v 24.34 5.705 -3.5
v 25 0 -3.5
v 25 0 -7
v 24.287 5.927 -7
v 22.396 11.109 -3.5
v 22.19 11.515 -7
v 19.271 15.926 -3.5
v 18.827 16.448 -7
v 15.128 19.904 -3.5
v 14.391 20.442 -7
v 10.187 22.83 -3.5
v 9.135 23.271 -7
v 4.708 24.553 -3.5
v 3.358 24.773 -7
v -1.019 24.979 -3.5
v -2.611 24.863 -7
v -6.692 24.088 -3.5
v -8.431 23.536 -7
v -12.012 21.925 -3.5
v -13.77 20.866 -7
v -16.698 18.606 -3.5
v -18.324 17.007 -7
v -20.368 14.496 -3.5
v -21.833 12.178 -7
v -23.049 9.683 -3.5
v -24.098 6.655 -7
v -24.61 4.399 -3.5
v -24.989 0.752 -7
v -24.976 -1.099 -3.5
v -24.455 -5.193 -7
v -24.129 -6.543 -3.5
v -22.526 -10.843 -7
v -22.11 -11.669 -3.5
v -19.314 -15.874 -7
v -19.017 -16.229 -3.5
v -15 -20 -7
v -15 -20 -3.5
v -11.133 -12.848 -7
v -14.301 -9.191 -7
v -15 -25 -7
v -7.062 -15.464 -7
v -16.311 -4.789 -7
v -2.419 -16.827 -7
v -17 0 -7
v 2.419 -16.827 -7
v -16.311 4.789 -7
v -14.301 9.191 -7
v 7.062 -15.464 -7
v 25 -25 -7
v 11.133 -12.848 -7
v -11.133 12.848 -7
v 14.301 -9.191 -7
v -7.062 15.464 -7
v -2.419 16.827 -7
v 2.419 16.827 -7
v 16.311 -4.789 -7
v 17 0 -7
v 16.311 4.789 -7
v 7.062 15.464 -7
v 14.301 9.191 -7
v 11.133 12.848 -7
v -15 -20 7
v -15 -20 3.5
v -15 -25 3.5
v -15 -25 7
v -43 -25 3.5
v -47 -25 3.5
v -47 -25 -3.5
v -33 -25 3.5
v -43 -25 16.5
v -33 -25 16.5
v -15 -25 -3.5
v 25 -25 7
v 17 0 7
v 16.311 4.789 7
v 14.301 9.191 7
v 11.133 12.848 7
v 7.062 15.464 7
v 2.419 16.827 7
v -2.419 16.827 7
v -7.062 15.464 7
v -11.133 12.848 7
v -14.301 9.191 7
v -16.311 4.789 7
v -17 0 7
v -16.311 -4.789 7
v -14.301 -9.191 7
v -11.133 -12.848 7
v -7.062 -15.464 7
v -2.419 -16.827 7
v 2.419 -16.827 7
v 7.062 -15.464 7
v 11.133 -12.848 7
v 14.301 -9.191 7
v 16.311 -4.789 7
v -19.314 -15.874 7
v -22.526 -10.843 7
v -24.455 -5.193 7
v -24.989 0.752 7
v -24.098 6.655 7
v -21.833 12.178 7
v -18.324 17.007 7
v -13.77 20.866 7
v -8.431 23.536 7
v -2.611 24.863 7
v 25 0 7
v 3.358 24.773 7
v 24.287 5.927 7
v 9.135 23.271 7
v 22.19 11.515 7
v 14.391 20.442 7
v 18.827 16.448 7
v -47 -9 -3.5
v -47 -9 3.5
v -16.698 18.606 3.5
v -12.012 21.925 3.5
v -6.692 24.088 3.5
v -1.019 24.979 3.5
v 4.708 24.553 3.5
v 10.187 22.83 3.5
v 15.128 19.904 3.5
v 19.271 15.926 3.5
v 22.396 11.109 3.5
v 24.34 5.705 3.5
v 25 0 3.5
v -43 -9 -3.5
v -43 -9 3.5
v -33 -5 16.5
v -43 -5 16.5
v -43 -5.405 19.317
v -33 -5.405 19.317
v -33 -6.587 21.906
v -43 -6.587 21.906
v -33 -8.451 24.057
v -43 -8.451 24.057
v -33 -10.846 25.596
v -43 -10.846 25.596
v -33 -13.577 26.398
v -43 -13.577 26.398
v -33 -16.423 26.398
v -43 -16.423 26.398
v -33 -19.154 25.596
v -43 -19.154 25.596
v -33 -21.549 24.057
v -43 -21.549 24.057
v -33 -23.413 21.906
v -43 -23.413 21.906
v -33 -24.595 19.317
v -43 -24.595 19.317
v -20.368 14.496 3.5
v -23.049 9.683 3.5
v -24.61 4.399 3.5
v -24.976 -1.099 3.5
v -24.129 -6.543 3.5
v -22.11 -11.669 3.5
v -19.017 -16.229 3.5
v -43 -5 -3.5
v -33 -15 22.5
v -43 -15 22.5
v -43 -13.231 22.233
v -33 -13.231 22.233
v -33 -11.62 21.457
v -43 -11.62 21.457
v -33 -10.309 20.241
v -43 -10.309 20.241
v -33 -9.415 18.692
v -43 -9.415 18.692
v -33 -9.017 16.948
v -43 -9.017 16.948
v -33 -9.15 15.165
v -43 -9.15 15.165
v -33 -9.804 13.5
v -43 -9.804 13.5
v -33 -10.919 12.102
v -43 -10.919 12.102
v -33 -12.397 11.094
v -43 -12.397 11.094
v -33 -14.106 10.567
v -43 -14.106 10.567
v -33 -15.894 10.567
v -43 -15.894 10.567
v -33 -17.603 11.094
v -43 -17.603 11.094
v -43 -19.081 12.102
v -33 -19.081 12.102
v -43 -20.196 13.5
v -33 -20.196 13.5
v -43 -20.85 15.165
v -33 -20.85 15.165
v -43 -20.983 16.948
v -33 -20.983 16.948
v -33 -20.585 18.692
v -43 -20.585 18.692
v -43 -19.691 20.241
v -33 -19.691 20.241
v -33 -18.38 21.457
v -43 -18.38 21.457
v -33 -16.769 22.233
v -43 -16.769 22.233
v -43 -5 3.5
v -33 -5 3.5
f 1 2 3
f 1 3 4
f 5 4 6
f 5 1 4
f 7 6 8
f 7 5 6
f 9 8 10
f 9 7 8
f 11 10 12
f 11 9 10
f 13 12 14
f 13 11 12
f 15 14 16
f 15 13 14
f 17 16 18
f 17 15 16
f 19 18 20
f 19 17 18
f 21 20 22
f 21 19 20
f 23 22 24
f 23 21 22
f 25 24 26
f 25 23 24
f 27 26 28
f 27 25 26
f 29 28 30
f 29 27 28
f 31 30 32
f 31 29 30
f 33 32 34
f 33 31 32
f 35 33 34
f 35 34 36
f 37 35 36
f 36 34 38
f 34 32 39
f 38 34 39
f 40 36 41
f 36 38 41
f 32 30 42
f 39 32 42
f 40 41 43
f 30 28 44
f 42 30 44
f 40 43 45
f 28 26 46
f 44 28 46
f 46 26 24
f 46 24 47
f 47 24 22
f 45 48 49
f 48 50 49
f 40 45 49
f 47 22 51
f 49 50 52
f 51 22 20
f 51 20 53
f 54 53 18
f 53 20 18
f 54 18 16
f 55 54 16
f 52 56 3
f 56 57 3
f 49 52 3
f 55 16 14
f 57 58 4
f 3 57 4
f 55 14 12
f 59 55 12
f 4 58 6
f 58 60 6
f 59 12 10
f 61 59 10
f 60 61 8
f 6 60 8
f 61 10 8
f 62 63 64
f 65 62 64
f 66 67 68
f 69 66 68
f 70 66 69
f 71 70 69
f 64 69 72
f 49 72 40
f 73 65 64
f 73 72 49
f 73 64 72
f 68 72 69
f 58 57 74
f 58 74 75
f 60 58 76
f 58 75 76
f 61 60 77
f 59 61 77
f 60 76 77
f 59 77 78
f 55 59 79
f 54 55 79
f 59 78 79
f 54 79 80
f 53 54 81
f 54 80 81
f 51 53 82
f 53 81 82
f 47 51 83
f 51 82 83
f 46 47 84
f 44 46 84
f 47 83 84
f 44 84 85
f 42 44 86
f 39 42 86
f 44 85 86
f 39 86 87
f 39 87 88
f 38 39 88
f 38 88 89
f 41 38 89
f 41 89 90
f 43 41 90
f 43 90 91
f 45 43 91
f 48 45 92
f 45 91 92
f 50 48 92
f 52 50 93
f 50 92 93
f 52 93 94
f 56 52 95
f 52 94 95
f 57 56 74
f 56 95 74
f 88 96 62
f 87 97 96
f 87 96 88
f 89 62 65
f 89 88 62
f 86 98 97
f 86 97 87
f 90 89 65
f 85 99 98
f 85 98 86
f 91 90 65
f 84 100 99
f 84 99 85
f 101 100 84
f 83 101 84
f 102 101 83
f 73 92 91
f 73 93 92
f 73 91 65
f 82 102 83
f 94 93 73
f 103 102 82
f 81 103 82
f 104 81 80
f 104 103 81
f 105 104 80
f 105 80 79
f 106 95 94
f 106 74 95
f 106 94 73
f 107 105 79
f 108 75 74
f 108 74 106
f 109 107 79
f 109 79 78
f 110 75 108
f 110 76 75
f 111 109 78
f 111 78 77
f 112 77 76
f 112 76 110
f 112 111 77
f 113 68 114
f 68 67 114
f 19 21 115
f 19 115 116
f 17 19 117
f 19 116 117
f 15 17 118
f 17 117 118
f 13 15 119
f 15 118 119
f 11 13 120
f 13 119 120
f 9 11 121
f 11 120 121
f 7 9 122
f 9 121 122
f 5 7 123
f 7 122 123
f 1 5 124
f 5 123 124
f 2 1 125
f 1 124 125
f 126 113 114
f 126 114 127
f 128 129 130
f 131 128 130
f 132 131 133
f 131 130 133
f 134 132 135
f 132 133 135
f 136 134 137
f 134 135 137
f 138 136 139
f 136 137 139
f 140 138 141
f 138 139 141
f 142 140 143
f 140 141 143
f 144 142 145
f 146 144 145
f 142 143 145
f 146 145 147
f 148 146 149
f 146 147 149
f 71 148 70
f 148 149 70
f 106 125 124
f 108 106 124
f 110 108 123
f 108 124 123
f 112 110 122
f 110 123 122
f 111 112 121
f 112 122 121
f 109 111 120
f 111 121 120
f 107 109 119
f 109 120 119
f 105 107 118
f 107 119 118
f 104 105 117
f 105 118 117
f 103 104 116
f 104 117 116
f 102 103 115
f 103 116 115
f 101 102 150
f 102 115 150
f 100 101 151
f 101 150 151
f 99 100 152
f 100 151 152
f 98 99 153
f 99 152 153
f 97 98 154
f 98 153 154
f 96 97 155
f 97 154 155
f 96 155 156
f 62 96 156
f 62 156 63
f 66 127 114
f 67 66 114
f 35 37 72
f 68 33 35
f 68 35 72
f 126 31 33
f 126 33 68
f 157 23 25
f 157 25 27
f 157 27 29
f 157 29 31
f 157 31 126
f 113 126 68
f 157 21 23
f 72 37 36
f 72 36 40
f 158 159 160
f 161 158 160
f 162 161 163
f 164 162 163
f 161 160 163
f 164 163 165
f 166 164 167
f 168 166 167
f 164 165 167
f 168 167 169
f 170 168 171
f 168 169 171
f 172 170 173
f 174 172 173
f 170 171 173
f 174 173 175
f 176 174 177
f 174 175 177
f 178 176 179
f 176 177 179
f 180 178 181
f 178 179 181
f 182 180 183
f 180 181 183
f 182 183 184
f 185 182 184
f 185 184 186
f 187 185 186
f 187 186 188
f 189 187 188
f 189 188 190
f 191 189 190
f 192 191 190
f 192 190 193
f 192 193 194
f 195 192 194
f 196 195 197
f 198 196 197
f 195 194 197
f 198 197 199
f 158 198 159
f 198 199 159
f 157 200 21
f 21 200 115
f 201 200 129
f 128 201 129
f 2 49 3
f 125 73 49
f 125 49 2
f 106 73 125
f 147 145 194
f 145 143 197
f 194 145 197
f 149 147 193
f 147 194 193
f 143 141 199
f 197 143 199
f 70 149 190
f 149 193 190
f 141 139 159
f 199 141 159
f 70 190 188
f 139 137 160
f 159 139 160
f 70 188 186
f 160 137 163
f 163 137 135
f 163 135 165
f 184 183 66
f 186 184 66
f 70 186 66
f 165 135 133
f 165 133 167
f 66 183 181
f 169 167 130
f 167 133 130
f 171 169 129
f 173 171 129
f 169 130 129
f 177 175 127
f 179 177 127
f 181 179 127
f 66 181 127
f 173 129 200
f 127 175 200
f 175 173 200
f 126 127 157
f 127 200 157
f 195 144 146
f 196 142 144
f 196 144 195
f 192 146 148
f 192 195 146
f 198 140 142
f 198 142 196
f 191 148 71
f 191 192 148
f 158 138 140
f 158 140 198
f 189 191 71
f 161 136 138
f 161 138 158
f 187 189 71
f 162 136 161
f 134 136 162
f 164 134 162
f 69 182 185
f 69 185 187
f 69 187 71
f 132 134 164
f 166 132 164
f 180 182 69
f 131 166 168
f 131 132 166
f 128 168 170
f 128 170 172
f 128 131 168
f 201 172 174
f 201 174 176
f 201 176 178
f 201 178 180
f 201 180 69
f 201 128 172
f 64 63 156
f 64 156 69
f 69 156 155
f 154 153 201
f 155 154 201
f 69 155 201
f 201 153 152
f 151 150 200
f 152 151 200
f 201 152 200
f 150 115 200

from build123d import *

# Parameters (mm, degrees)
SKETCH1_R           = 17
BOSS_EXTRUDE1_DEPTH = 3.5
SKETCH3_R           = 17
BOSS_EXTRUDE2_DEPTH = 3.5
SKETCH4_R           = 6
BOSS_EXTRUDE3_DEPTH = 10


with BuildPart() as part:
    # Sketch1 → Boss-Extrude1 (new, symmetric)
    with BuildSketch(Plane.XY):
        with BuildLine():
            Line((25, 0), (25, -25))
            Line((25, -25), (-47, -25))
            Line((-47, -25), (-47, -9))
            Line((-47, -9), (-43, -9))
            Line((-43, -9), (-43, -5))
            Line((-43, -5), (-16.69831871, 18.605540902))
            ThreePointArc((-16.69831871, 18.605540902), (10.186805983, 22.830439853), (25, 0))
        make_face()
        Circle(SKETCH1_R, mode=Mode.SUBTRACT)
    extrude(amount=BOSS_EXTRUDE1_DEPTH, both=True)

    # Sketch3 → Boss-Extrude2 (add)
    with BuildSketch(Plane.XY.offset(3.5)):
        with BuildLine():
            Line((25, -25), (25, 0))
            ThreePointArc((25, 0), (-11.180339887, 22.360679775), (-15, -20))
            Line((-15, -20), (-15, -25))
            Line((-15, -25), (25, -25))
        make_face()
        Circle(SKETCH3_R, mode=Mode.SUBTRACT)
    boss_extrude2 = extrude(amount=BOSS_EXTRUDE2_DEPTH)

    # Mirror1: Boss-Extrude2 across plane
    add(boss_extrude2.mirror(Plane.XY))

    # Sketch4 → Boss-Extrude3 (add)
    with BuildSketch(Plane.ZY.offset(43)):
        with BuildLine():
            Line((3.5, -5), (16.5, -5))
            ThreePointArc((16.5, -5), (26.5, -15), (16.5, -25))
            Line((16.5, -25), (3.5, -25))
            Line((3.5, -25), (3.5, -5))
        make_face()
        with Locations((16.5, -15)):
            Circle(SKETCH4_R, mode=Mode.SUBTRACT)
    extrude(amount=-BOSS_EXTRUDE3_DEPTH)


solid = part.part
